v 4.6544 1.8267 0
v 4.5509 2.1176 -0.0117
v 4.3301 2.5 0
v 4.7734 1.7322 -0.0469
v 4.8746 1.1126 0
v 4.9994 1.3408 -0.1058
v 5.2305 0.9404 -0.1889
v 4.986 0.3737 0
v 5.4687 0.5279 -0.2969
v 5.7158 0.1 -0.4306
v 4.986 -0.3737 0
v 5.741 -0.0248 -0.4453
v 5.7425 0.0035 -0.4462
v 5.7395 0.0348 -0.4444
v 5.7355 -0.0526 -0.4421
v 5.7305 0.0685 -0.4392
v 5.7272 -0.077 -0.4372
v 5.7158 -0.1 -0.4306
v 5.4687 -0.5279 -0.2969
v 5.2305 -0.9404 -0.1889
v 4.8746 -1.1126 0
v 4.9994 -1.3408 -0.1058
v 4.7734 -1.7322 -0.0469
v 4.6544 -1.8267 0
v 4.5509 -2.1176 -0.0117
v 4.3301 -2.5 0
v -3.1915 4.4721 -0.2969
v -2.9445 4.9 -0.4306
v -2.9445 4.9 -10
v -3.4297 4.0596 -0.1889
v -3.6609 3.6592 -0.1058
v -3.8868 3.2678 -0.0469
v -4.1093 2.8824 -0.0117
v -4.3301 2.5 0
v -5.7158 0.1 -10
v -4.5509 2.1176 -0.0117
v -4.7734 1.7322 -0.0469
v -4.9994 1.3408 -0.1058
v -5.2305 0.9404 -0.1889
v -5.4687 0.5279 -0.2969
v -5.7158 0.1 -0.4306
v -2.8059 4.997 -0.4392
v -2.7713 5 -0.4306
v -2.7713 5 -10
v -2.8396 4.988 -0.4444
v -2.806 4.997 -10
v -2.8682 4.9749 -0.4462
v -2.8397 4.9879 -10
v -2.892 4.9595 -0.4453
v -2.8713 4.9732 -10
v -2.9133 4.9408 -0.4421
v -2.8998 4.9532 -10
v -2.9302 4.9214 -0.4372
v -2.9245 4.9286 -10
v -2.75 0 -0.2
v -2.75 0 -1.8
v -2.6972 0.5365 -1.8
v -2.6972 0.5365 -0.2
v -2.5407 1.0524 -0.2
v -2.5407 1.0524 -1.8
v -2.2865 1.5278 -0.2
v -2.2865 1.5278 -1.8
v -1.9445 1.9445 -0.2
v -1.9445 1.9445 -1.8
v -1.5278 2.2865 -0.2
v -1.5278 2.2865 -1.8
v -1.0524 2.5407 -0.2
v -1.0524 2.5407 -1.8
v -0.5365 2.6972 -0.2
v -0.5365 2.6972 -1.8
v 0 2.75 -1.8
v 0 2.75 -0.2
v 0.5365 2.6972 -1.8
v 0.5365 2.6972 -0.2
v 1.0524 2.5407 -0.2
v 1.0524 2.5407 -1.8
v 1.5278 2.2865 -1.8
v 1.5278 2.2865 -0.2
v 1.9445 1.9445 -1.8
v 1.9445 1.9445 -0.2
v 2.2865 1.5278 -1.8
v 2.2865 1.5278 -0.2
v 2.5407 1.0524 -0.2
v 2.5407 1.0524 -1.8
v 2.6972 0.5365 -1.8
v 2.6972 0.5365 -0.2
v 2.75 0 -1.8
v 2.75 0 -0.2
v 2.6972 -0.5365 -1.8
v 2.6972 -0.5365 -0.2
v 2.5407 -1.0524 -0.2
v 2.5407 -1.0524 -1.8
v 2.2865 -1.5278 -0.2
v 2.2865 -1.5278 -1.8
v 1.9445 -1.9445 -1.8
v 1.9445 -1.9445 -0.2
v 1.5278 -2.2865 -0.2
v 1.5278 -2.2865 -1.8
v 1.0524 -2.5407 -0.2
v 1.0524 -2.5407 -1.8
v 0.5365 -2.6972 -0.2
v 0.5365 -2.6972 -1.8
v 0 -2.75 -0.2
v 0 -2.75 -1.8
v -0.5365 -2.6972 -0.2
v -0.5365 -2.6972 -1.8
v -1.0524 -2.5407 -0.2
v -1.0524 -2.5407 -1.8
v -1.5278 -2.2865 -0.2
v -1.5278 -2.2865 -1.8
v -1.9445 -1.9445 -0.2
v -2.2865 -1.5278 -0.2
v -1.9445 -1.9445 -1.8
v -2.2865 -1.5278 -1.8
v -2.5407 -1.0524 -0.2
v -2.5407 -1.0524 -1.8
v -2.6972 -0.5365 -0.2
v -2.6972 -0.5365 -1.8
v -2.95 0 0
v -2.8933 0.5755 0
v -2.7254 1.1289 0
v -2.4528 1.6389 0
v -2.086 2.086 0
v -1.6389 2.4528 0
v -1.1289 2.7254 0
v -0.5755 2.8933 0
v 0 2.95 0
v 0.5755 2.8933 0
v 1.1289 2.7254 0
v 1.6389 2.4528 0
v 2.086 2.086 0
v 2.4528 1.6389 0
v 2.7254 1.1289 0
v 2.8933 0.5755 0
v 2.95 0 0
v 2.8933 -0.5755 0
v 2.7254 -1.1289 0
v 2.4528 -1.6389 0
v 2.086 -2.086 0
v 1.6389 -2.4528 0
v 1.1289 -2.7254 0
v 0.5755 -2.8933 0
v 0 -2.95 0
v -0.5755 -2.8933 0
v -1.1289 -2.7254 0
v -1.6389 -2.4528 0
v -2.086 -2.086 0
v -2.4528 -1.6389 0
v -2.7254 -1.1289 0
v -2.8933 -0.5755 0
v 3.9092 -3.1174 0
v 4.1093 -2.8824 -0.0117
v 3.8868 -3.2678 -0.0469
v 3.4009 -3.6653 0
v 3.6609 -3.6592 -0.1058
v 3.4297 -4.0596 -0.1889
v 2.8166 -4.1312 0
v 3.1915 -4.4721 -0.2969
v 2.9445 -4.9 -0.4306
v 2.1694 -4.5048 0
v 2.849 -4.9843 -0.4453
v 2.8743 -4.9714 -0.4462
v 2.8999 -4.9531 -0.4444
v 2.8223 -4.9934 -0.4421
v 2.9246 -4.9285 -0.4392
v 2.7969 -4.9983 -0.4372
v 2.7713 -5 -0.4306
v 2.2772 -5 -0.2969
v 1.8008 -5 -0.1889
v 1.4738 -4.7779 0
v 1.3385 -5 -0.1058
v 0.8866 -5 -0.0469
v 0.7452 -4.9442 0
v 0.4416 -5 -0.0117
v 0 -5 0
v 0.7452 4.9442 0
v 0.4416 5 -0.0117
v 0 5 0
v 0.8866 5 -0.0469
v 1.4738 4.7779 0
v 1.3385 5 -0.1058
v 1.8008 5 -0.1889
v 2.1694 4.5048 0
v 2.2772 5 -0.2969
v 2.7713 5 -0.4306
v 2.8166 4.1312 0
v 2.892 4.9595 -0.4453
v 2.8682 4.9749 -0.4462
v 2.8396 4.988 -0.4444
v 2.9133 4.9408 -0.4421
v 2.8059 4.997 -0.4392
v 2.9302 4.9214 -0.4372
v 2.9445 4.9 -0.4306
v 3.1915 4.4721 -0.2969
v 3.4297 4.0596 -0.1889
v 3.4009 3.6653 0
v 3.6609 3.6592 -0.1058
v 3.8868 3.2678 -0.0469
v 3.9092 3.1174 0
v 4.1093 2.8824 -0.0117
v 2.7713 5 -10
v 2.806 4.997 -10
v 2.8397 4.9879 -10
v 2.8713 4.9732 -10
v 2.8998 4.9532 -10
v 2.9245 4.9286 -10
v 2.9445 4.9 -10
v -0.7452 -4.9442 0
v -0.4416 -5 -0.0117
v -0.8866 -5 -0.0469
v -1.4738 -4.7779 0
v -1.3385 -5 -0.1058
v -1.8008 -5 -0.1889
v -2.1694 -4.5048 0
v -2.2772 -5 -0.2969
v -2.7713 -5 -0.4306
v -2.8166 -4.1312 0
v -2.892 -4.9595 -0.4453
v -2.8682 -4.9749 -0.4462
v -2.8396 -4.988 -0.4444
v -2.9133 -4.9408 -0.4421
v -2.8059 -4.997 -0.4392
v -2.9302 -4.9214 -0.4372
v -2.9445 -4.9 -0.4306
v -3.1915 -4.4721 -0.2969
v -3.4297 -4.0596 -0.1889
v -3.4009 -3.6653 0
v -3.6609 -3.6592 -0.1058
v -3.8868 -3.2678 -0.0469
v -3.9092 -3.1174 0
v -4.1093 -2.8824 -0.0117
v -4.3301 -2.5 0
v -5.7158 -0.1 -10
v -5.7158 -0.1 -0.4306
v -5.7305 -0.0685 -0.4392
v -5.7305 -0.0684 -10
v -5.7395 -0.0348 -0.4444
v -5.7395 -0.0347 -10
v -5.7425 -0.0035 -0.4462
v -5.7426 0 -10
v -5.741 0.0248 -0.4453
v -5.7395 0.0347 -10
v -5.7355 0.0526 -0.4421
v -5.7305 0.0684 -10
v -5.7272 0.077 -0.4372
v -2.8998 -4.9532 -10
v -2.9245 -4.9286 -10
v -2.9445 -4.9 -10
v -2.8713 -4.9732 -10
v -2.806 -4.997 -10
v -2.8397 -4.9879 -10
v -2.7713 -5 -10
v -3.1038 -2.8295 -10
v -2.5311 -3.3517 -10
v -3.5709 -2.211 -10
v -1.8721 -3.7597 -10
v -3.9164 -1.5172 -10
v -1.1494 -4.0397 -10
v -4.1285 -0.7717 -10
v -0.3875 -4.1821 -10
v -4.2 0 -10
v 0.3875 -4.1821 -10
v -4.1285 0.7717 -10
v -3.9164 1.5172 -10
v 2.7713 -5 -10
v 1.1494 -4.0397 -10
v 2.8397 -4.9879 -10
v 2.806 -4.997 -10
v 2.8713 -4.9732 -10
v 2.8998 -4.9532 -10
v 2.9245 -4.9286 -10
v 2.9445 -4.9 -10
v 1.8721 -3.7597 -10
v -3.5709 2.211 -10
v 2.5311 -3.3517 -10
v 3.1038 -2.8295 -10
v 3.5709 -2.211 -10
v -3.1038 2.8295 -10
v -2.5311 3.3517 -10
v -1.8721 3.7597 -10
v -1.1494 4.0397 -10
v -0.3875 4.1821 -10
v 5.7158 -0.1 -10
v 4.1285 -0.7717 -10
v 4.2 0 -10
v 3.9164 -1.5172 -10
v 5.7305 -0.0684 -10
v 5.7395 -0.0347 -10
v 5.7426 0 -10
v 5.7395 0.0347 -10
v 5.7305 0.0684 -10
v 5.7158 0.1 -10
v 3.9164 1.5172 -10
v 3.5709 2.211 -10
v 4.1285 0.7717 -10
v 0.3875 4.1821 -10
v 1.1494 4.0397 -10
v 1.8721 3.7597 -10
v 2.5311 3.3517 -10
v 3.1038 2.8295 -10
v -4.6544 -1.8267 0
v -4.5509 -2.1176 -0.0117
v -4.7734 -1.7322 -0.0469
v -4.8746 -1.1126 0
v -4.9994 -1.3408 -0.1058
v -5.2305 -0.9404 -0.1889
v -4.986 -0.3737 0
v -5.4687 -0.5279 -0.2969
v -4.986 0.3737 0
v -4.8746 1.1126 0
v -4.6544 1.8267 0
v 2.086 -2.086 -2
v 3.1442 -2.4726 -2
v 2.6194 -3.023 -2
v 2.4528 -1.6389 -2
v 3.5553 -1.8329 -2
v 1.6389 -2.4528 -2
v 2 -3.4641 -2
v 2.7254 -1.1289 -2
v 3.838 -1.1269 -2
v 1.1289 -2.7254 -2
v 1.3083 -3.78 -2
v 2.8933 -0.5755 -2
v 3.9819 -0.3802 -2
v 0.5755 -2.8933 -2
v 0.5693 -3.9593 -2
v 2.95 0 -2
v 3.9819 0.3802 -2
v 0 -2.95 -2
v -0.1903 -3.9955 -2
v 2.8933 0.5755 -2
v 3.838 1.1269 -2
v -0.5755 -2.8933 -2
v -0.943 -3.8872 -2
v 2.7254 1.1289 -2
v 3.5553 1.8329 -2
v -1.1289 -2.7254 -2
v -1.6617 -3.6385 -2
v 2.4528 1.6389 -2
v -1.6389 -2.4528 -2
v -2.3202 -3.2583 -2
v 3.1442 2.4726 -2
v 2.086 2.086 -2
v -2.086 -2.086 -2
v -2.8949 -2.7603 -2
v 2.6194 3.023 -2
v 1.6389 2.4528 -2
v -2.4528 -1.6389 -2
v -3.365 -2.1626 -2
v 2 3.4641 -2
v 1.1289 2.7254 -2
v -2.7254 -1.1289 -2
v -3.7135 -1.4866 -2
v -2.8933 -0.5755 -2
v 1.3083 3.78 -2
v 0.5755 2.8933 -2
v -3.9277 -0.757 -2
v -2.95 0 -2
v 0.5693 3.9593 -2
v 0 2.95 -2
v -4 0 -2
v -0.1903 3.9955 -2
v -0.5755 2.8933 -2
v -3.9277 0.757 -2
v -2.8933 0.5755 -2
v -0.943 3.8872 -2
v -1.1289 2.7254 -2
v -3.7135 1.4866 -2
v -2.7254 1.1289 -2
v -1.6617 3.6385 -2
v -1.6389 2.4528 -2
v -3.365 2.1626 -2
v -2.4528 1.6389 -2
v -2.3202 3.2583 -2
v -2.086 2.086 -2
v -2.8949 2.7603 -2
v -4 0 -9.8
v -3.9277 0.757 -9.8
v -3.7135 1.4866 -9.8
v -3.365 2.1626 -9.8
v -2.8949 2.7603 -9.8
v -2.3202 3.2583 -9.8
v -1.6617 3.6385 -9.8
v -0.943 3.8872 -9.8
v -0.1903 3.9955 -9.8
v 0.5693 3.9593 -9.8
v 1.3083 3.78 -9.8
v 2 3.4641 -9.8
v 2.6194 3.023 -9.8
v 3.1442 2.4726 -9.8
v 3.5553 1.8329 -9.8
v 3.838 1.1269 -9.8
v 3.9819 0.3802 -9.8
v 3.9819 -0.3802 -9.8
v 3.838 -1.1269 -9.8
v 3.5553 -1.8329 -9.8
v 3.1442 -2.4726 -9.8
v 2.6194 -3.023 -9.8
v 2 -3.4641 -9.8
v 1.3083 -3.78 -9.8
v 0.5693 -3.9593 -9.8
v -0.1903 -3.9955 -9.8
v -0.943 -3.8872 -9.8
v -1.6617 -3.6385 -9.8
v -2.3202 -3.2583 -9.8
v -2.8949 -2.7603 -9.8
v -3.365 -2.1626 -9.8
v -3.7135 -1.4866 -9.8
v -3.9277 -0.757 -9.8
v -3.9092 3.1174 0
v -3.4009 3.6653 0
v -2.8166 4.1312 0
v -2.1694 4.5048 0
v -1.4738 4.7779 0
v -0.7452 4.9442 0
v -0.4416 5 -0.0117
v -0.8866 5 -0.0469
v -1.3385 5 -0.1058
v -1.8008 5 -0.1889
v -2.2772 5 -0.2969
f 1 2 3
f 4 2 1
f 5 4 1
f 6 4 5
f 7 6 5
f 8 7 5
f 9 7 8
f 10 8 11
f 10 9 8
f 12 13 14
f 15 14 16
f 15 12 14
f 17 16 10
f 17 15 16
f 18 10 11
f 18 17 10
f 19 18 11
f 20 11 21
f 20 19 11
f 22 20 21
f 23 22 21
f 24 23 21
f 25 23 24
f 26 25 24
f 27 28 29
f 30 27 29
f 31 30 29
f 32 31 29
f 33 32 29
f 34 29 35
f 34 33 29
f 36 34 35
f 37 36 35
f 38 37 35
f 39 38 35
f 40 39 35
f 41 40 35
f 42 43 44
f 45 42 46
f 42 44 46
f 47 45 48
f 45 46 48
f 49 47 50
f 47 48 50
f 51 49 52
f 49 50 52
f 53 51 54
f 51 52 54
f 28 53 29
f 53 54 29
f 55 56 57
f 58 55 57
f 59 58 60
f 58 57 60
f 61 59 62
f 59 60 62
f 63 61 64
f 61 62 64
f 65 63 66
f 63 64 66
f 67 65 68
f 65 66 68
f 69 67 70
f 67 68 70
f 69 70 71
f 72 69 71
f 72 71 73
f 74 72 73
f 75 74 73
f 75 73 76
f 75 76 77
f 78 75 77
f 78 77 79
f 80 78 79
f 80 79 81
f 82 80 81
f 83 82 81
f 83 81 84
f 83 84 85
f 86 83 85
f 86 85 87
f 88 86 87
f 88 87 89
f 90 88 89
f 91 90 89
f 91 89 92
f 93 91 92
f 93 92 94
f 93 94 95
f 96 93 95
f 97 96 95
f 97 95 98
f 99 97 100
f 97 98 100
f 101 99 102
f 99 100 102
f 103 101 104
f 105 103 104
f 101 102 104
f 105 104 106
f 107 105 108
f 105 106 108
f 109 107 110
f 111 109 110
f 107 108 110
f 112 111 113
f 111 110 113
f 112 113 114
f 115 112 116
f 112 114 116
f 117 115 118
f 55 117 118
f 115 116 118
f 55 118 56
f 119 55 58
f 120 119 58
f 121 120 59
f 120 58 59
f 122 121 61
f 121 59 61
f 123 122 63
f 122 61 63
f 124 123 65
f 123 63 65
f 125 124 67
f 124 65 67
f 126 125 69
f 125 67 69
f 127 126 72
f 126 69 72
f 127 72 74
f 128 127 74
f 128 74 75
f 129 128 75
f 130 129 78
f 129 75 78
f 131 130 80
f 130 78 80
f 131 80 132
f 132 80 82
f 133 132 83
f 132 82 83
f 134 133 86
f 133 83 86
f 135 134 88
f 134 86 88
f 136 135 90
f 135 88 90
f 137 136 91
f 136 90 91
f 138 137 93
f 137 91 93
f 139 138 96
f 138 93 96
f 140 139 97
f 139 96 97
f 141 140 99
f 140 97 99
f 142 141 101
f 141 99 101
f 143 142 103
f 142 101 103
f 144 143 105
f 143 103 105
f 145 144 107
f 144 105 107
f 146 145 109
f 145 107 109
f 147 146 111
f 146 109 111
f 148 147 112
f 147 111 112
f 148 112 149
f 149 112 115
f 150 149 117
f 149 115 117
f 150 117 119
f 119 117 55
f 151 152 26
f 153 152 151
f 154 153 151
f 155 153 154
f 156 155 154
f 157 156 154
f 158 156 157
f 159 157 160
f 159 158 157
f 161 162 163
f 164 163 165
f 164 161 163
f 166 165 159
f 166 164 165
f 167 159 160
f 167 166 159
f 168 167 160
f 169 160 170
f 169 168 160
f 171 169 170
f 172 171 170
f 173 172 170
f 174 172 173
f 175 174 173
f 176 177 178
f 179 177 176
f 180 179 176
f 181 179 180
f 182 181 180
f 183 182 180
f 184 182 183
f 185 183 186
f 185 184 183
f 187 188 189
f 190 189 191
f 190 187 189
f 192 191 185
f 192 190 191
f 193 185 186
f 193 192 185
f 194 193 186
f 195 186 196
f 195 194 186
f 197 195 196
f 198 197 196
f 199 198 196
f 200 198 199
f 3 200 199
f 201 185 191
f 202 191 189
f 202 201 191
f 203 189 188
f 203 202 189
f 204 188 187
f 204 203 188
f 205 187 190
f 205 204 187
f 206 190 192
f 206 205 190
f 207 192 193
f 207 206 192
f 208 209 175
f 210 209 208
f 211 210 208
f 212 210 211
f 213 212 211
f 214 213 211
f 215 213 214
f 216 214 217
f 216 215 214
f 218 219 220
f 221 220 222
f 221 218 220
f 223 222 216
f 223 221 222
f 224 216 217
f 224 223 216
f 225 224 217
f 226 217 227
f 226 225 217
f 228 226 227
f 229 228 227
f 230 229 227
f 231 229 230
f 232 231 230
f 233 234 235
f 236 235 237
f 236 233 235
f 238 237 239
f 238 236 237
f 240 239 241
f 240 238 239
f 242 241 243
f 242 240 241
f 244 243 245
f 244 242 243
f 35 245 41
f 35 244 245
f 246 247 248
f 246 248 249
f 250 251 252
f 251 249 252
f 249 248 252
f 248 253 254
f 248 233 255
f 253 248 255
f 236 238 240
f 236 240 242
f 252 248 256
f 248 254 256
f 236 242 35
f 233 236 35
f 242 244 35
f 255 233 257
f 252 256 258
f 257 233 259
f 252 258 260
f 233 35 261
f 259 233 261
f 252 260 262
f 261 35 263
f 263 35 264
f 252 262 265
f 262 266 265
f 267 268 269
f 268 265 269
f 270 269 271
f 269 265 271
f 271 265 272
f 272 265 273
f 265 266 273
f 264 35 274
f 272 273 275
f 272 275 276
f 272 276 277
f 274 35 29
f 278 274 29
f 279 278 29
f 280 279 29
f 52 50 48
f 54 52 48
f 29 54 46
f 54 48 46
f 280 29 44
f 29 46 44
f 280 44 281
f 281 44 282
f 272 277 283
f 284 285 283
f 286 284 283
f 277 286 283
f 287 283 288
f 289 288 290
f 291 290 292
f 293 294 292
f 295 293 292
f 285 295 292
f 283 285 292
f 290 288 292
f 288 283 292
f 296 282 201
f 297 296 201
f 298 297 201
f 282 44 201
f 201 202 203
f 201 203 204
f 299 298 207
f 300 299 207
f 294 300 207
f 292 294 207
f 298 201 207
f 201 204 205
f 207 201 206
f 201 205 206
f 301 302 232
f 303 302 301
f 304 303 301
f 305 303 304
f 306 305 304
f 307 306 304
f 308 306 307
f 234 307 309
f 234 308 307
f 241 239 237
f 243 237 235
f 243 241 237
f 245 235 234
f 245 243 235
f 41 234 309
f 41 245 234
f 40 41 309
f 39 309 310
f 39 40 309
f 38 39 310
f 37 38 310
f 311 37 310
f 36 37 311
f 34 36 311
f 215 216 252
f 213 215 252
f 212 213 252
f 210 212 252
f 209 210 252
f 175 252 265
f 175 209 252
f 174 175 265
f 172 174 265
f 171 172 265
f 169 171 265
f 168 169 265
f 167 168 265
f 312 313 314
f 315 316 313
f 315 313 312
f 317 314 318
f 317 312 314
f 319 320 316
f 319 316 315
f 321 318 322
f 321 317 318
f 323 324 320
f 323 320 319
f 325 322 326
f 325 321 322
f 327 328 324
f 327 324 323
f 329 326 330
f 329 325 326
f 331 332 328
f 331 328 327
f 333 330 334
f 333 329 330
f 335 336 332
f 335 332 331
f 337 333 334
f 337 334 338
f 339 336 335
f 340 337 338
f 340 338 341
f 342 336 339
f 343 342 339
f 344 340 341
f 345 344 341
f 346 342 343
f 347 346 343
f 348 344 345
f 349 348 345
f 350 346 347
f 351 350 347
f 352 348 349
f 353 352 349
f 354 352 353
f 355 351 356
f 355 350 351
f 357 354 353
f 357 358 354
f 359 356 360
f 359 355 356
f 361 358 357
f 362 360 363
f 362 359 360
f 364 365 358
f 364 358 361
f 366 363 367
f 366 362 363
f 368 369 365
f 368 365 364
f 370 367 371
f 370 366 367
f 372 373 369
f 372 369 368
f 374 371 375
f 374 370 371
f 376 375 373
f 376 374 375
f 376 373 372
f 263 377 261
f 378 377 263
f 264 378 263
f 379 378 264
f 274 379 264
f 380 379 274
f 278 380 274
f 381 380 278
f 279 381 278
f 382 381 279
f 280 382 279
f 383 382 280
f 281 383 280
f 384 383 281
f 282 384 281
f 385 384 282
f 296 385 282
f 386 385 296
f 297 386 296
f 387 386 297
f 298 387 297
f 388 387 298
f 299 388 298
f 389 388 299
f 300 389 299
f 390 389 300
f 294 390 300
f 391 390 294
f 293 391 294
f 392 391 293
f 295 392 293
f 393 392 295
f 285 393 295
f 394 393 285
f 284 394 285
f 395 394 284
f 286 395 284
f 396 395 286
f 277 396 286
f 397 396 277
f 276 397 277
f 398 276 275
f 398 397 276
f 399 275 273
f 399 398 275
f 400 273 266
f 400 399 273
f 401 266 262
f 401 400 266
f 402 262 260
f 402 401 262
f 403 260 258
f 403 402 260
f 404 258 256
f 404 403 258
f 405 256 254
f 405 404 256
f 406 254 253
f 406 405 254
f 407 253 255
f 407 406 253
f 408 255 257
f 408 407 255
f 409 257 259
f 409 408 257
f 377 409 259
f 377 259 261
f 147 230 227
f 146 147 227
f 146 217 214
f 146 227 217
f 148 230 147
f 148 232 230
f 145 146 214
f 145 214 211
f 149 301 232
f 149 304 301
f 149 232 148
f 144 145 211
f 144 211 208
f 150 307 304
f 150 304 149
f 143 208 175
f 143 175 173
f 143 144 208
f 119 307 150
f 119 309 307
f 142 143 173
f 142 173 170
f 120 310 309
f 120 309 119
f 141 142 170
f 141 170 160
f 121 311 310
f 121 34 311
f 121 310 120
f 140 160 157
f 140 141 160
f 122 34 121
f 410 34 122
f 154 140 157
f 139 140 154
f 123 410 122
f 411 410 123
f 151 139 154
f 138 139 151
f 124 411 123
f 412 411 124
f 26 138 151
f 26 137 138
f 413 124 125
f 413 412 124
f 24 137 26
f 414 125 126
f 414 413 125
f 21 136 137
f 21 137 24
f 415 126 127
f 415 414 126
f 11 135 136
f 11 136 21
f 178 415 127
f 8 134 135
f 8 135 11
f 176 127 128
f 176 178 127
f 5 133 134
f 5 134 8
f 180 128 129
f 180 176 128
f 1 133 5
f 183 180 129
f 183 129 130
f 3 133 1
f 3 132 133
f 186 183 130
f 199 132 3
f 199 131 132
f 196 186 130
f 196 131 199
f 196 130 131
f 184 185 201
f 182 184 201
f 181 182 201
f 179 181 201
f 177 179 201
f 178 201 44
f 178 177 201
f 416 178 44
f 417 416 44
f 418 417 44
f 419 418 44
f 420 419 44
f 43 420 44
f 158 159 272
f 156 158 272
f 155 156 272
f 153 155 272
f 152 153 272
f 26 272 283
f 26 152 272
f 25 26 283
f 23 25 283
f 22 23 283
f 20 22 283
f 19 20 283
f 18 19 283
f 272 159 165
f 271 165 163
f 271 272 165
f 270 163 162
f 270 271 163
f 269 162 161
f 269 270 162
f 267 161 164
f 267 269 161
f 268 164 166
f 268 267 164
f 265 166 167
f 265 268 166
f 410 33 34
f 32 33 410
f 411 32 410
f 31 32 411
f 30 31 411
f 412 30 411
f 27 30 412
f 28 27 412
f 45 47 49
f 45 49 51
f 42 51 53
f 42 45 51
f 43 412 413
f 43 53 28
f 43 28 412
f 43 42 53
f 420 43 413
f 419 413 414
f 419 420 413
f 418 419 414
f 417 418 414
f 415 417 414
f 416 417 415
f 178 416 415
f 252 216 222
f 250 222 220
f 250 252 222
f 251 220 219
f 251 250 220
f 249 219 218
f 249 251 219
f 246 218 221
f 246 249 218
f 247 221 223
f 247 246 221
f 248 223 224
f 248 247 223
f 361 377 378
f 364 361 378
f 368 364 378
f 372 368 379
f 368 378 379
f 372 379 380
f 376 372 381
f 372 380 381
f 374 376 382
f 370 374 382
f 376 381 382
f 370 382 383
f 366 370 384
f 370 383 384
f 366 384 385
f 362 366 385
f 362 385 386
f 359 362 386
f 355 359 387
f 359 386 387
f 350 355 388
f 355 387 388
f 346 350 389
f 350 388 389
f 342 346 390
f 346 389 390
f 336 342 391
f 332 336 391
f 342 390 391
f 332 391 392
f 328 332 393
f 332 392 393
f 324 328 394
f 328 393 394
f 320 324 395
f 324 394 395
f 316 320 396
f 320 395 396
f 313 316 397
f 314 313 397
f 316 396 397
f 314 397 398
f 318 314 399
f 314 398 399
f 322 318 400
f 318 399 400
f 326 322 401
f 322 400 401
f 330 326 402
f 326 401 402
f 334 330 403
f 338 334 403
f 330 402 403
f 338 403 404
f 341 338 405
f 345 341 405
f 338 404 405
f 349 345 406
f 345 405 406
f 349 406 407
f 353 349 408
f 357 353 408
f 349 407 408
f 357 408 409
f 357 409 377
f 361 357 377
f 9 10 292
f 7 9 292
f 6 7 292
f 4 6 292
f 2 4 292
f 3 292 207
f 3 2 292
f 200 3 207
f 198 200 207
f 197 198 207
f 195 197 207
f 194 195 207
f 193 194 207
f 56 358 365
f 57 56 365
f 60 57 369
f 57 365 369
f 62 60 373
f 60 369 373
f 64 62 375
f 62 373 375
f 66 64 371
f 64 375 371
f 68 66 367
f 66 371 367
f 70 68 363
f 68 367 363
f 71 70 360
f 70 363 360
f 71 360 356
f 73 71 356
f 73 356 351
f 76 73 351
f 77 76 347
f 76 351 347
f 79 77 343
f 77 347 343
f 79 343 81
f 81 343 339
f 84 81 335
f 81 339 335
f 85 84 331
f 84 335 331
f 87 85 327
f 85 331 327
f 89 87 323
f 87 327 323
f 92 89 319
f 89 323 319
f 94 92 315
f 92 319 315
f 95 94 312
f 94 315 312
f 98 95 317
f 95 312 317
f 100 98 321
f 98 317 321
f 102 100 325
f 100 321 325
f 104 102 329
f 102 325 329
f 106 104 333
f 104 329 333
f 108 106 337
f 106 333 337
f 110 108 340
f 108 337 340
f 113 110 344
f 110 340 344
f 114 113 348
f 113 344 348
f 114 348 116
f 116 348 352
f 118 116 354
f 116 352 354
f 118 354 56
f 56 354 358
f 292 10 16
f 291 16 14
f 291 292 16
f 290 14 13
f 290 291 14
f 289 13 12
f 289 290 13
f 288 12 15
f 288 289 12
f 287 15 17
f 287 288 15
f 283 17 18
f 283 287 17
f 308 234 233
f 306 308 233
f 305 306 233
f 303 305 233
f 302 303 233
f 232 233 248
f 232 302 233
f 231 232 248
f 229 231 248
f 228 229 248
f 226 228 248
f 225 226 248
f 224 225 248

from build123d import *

# Parameters (mm, degrees)
ESTRUSIONE_ESTRUSIONE1_DEPTH = 10
SCHIZZO6_OUTSIDE_W           = 18.864
SCHIZZO6_OUTSIDE_H           = 17.316
SCHIZZO6_OUTSIDE_R           = 5
TAGLIO_ESTRUSIONE1_DEPTH     = 0.5
TAGLIO_ESTRUSIONE1_TAPER     = 59
RACCORDO1_R                  = 0.2
SCHIZZO19_R                  = 4
TAGLIO_ESTRUSIONE5_DEPTH     = 8
TAGLIO_ESTRUSIONE6_REACH     = 4
SCHIZZO20_R                  = 2.75
SMUSSO3_SIZE                 = 0.2


with BuildPart() as part:
    # Schizzo4 → Estrusione-Estrusione1 (new body)
    with BuildSketch(Plane.XY):
        Polygon((2.886751346, 5), (-2.886751346, 5), (-5.773502692, 0), (-2.886751346, -5), (2.886751346, -5), (5.773502692, 0), align=None)
    extrude(amount=-ESTRUSIONE_ESTRUSIONE1_DEPTH)

    # Schizzo6 outside → Taglio-Estrusione1 (cut)
    with BuildSketch(Plane.XY):
        Rectangle(SCHIZZO6_OUTSIDE_W, SCHIZZO6_OUTSIDE_H)
        Circle(SCHIZZO6_OUTSIDE_R, mode=Mode.SUBTRACT)
    extrude(amount=-TAGLIO_ESTRUSIONE1_DEPTH, taper=TAGLIO_ESTRUSIONE1_TAPER, mode=Mode.SUBTRACT)

    # Raccordo1
    raccordo1_edges = [part.edges().sort_by_distance(p)[0] for p in [
        (2.886751346, -5, -5.232383653),
        (-2.886751346, -5, -5.232383653),
        (-5.773502692, 0, -5.232383653),
        (-2.886751346, 5, -5.232383653),
        (2.886751346, 5, -5.232383653),
        (5.773502692, 0, -5.232383653),
    ]]
    fillet(raccordo1_edges, radius=RACCORDO1_R)

    # Schizzo19 → Taglio-Estrusione5 (cut)
    with BuildSketch(Plane(origin=(0, 0, -10), x_dir=(-1, 0, 0), z_dir=(0, 0, -1))):
        Circle(SCHIZZO19_R)
    extrude(amount=-TAGLIO_ESTRUSIONE5_DEPTH, mode=Mode.SUBTRACT)

    # Schizzo20 → Taglio-Estrusione6 (cut, up to next)
    with BuildSketch(Plane(origin=(0, 0, -2), x_dir=(-1, 0, 0), z_dir=(0, 0, -1)), mode=Mode.PRIVATE) as taglio_estrusione6_sk1:
        Circle(SCHIZZO20_R)
    taglio_estrusione6_tool1 = extrude(taglio_estrusione6_sk1.sketch, amount=-TAGLIO_ESTRUSIONE6_REACH, mode=Mode.PRIVATE) & part.part
    add(taglio_estrusione6_tool1.solids().sort_by_distance((0, 0, -2))[0], mode=Mode.SUBTRACT)

    # Smusso3
    smusso3_edges = [part.edges().sort_by_distance(p)[0] for p in [
        (4, 0, -10),
        (2.75, 0, 0),
        (2.75, 0, -2),
    ]]
    chamfer(smusso3_edges, length=SMUSSO3_SIZE)


solid = part.part
